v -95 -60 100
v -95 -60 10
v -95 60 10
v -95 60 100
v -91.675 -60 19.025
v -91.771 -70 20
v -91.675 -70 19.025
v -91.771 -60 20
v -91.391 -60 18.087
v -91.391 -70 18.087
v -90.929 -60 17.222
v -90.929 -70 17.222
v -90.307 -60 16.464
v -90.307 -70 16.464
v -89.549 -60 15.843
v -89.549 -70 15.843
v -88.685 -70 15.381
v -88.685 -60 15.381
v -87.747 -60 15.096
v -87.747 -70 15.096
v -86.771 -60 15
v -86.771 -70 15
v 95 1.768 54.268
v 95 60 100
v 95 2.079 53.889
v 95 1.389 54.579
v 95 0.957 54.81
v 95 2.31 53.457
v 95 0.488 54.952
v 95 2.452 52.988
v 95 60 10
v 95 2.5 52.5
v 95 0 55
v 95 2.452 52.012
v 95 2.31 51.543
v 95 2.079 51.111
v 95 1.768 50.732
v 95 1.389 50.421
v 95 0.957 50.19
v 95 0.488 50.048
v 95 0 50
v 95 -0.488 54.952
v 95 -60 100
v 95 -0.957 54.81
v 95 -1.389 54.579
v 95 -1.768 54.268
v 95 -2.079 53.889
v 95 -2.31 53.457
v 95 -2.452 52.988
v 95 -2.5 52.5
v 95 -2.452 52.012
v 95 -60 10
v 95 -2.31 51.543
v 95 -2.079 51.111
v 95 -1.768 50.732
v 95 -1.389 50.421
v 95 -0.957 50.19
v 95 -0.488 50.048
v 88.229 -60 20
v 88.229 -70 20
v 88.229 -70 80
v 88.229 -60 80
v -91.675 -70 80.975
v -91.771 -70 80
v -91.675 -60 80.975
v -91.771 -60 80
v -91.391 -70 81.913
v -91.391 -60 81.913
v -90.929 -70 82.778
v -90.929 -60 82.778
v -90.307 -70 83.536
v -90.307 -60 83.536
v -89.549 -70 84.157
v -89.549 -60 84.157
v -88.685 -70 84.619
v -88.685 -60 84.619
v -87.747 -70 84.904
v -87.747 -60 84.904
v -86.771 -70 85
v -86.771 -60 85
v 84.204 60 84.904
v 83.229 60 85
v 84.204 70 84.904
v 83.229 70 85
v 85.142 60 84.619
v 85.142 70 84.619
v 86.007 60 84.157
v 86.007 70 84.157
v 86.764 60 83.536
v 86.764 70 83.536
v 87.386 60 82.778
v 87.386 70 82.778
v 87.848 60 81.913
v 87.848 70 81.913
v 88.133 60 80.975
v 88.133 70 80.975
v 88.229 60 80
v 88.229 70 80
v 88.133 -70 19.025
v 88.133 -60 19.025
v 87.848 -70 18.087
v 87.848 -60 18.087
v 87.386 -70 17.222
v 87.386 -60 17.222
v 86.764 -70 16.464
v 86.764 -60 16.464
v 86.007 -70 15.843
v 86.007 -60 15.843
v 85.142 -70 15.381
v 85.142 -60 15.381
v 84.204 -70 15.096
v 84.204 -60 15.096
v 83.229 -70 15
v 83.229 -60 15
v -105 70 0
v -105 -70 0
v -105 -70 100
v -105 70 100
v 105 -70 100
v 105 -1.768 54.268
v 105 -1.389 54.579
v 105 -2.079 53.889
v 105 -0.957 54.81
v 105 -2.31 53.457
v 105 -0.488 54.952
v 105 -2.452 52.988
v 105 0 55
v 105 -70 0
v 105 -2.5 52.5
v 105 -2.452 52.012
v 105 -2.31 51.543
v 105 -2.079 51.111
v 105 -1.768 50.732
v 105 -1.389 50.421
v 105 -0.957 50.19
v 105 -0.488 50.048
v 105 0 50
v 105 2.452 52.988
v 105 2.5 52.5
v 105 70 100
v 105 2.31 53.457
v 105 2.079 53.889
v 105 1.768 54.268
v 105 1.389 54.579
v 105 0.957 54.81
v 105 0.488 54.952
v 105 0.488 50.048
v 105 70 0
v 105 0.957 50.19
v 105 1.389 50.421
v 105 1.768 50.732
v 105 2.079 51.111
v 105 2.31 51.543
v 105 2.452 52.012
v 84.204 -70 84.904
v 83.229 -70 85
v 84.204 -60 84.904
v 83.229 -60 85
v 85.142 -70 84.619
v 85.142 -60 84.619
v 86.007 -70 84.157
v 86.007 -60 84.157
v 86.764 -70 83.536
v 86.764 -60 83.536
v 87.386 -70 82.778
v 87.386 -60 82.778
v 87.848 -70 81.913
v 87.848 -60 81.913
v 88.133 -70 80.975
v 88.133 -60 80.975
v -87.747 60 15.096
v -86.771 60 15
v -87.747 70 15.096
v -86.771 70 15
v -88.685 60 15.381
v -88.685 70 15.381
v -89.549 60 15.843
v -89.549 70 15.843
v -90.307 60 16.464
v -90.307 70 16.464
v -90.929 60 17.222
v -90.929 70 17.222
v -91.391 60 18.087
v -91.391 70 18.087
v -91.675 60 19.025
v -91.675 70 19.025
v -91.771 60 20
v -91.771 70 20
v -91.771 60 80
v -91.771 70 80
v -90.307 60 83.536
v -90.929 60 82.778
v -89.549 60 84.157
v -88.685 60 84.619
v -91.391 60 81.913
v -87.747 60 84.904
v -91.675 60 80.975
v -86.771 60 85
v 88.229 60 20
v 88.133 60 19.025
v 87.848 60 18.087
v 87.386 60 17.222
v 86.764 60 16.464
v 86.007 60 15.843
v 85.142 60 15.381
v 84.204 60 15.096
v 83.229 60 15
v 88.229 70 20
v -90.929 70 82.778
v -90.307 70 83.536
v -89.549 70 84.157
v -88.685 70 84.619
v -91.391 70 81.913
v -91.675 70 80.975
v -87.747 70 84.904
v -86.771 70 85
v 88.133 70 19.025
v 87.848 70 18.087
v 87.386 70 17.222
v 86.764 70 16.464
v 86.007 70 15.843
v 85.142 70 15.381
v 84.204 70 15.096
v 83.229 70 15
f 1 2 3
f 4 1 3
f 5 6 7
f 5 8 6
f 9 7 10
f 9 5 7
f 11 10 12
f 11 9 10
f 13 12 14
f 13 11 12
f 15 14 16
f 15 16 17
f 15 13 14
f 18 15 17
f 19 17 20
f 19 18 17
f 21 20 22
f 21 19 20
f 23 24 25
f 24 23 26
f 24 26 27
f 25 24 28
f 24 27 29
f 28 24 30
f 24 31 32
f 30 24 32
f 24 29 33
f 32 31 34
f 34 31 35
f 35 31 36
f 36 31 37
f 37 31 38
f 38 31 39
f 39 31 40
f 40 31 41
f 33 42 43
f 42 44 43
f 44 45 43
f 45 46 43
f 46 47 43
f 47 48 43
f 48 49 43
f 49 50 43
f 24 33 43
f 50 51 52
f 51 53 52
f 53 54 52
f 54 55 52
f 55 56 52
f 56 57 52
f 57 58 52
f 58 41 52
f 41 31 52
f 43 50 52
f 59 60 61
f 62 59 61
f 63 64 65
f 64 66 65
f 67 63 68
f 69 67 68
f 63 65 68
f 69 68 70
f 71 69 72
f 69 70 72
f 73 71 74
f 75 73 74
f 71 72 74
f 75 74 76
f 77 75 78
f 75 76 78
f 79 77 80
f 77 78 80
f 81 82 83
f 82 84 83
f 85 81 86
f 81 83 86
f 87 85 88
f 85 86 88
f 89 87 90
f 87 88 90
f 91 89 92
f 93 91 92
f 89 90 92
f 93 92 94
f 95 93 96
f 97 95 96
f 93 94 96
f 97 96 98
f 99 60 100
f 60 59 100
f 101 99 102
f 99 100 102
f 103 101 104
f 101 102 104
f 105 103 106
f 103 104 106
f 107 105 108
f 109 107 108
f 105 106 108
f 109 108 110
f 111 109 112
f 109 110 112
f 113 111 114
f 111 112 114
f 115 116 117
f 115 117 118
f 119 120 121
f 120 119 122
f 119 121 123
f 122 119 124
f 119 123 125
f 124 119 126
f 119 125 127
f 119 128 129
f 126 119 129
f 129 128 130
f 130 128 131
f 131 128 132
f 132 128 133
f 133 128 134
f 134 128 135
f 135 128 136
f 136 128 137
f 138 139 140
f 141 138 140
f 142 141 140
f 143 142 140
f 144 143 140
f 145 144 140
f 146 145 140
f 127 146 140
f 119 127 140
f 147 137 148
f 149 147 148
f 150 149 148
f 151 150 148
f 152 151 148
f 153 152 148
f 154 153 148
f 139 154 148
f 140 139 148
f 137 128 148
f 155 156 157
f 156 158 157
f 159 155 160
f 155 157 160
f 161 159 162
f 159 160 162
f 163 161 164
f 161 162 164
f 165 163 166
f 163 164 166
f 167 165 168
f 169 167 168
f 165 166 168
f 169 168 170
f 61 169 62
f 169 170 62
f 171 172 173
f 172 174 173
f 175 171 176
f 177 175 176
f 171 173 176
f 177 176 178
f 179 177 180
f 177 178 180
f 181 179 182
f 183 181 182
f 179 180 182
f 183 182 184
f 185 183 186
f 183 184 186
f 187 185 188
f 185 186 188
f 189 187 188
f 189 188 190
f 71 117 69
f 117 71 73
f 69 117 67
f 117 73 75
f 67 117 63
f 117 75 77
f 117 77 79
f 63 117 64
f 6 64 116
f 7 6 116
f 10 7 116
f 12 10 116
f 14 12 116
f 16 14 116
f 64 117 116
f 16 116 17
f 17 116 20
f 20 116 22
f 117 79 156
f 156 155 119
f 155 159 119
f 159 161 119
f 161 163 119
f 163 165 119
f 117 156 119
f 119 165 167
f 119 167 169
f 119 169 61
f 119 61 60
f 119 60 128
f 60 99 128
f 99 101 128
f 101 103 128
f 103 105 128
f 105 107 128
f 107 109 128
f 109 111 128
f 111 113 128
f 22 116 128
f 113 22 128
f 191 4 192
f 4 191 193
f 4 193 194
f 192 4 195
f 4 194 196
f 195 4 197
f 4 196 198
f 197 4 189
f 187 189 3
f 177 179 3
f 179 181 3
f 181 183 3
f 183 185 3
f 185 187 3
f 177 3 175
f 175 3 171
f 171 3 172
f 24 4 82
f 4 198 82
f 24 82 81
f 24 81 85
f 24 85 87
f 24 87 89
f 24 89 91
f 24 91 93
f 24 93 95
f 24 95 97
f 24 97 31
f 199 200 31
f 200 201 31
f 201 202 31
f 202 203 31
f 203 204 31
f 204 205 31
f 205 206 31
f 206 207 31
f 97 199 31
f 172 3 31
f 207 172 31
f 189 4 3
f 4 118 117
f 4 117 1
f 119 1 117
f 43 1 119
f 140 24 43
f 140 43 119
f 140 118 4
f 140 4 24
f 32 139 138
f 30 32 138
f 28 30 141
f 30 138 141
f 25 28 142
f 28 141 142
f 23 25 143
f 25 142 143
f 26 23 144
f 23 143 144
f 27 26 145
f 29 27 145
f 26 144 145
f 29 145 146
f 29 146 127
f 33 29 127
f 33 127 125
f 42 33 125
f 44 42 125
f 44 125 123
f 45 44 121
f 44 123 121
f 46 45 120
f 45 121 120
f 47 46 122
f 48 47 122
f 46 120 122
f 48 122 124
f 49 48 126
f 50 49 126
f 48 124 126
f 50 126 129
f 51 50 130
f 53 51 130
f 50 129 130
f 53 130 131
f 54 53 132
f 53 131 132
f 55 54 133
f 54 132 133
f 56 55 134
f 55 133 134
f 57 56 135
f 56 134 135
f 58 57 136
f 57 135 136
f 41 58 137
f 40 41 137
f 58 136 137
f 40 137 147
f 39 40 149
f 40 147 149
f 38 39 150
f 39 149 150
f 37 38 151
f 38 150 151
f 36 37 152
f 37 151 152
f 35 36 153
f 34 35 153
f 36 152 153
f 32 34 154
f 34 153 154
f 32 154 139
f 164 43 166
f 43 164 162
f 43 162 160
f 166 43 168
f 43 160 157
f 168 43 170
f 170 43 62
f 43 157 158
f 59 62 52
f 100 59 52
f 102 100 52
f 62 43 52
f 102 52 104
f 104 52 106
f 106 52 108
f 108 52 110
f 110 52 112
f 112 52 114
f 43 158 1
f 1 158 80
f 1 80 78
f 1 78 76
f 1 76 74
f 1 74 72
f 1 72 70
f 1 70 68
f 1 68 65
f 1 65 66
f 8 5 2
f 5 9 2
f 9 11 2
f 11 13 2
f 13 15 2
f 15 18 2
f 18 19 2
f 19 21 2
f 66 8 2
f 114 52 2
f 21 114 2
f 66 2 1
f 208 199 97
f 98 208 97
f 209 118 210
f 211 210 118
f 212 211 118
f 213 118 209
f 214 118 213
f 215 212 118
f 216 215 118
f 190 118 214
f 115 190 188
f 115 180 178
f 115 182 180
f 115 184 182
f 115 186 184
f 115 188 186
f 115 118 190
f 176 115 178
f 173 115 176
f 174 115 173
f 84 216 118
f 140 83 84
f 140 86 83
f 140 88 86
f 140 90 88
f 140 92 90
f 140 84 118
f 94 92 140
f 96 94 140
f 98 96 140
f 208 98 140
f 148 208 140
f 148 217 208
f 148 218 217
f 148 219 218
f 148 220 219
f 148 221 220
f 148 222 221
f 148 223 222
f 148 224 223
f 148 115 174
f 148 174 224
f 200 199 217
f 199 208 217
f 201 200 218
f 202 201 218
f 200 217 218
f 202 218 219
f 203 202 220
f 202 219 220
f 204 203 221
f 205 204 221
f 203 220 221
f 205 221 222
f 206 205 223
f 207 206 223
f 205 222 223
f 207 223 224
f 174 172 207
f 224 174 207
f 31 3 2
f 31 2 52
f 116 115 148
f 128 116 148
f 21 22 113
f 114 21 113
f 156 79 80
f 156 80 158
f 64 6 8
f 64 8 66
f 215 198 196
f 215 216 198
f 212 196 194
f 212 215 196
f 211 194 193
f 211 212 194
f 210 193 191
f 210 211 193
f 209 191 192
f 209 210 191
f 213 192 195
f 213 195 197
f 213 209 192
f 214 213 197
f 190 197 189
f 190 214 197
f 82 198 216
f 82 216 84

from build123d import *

# Parameters (mm, degrees)
F1_DEPTH = 10
F0_W     = 210
F0_H     = 140
F2_DEPTH = 100
F3_W     = 180
F3_H     = 70
F4_DEPTH = 202.553704
F5_R     = 2.5
F6_DEPTH = 10
F7_R     = 5


with BuildPart() as f1:
    # F0 (on Top) → F1 (new body)
    with BuildSketch(Plane.XY):
        Polygon((82.656699, -60), (95, -60), (95, 60), (82.656699, 60), (72.656699, 60), (-95, 60), (-95, -60), (72.656699, -60), align=None)
    extrude(amount=F1_DEPTH)

    # F0 (on Top) → F2 (join)
    with BuildSketch(Plane.XY):
        Rectangle(F0_W, F0_H)
        Polygon((95, 60), (95, -60), (82.656699, -60), (72.656699, -60), (-95, -60), (-95, 60), (72.656699, 60), (82.656699, 60), align=None, mode=Mode.SUBTRACT)
    extrude(amount=F2_DEPTH)

    # F3 (on face) → F4 (cut)
    with BuildSketch(Plane.XZ.offset(70)):
        with Locations((-1.771243, 50)):
            Rectangle(F3_W, F3_H)
    extrude(amount=-F4_DEPTH, mode=Mode.SUBTRACT)

    # F5 (on face) → F6 (cut)
    with BuildSketch(Plane.YZ.offset(105)):
        with Locations((0, 52.499999)):
            Circle(F5_R)
    extrude(amount=-F6_DEPTH, mode=Mode.SUBTRACT)

    # F7
    f7_edges = [f1.edges().sort_by_distance(p)[0] for p in [
        (-91.771243, -65, 15),
        (-91.771243, 65, 15),
        (-91.771243, -65, 85),
        (-91.771243, 65, 85),
        (88.228757, -65, 15),
        (88.228757, 65, 15),
        (88.228757, -65, 85),
        (88.228757, 65, 85),
    ]]
    fillet(f7_edges, radius=F7_R)


solid = f1.part
